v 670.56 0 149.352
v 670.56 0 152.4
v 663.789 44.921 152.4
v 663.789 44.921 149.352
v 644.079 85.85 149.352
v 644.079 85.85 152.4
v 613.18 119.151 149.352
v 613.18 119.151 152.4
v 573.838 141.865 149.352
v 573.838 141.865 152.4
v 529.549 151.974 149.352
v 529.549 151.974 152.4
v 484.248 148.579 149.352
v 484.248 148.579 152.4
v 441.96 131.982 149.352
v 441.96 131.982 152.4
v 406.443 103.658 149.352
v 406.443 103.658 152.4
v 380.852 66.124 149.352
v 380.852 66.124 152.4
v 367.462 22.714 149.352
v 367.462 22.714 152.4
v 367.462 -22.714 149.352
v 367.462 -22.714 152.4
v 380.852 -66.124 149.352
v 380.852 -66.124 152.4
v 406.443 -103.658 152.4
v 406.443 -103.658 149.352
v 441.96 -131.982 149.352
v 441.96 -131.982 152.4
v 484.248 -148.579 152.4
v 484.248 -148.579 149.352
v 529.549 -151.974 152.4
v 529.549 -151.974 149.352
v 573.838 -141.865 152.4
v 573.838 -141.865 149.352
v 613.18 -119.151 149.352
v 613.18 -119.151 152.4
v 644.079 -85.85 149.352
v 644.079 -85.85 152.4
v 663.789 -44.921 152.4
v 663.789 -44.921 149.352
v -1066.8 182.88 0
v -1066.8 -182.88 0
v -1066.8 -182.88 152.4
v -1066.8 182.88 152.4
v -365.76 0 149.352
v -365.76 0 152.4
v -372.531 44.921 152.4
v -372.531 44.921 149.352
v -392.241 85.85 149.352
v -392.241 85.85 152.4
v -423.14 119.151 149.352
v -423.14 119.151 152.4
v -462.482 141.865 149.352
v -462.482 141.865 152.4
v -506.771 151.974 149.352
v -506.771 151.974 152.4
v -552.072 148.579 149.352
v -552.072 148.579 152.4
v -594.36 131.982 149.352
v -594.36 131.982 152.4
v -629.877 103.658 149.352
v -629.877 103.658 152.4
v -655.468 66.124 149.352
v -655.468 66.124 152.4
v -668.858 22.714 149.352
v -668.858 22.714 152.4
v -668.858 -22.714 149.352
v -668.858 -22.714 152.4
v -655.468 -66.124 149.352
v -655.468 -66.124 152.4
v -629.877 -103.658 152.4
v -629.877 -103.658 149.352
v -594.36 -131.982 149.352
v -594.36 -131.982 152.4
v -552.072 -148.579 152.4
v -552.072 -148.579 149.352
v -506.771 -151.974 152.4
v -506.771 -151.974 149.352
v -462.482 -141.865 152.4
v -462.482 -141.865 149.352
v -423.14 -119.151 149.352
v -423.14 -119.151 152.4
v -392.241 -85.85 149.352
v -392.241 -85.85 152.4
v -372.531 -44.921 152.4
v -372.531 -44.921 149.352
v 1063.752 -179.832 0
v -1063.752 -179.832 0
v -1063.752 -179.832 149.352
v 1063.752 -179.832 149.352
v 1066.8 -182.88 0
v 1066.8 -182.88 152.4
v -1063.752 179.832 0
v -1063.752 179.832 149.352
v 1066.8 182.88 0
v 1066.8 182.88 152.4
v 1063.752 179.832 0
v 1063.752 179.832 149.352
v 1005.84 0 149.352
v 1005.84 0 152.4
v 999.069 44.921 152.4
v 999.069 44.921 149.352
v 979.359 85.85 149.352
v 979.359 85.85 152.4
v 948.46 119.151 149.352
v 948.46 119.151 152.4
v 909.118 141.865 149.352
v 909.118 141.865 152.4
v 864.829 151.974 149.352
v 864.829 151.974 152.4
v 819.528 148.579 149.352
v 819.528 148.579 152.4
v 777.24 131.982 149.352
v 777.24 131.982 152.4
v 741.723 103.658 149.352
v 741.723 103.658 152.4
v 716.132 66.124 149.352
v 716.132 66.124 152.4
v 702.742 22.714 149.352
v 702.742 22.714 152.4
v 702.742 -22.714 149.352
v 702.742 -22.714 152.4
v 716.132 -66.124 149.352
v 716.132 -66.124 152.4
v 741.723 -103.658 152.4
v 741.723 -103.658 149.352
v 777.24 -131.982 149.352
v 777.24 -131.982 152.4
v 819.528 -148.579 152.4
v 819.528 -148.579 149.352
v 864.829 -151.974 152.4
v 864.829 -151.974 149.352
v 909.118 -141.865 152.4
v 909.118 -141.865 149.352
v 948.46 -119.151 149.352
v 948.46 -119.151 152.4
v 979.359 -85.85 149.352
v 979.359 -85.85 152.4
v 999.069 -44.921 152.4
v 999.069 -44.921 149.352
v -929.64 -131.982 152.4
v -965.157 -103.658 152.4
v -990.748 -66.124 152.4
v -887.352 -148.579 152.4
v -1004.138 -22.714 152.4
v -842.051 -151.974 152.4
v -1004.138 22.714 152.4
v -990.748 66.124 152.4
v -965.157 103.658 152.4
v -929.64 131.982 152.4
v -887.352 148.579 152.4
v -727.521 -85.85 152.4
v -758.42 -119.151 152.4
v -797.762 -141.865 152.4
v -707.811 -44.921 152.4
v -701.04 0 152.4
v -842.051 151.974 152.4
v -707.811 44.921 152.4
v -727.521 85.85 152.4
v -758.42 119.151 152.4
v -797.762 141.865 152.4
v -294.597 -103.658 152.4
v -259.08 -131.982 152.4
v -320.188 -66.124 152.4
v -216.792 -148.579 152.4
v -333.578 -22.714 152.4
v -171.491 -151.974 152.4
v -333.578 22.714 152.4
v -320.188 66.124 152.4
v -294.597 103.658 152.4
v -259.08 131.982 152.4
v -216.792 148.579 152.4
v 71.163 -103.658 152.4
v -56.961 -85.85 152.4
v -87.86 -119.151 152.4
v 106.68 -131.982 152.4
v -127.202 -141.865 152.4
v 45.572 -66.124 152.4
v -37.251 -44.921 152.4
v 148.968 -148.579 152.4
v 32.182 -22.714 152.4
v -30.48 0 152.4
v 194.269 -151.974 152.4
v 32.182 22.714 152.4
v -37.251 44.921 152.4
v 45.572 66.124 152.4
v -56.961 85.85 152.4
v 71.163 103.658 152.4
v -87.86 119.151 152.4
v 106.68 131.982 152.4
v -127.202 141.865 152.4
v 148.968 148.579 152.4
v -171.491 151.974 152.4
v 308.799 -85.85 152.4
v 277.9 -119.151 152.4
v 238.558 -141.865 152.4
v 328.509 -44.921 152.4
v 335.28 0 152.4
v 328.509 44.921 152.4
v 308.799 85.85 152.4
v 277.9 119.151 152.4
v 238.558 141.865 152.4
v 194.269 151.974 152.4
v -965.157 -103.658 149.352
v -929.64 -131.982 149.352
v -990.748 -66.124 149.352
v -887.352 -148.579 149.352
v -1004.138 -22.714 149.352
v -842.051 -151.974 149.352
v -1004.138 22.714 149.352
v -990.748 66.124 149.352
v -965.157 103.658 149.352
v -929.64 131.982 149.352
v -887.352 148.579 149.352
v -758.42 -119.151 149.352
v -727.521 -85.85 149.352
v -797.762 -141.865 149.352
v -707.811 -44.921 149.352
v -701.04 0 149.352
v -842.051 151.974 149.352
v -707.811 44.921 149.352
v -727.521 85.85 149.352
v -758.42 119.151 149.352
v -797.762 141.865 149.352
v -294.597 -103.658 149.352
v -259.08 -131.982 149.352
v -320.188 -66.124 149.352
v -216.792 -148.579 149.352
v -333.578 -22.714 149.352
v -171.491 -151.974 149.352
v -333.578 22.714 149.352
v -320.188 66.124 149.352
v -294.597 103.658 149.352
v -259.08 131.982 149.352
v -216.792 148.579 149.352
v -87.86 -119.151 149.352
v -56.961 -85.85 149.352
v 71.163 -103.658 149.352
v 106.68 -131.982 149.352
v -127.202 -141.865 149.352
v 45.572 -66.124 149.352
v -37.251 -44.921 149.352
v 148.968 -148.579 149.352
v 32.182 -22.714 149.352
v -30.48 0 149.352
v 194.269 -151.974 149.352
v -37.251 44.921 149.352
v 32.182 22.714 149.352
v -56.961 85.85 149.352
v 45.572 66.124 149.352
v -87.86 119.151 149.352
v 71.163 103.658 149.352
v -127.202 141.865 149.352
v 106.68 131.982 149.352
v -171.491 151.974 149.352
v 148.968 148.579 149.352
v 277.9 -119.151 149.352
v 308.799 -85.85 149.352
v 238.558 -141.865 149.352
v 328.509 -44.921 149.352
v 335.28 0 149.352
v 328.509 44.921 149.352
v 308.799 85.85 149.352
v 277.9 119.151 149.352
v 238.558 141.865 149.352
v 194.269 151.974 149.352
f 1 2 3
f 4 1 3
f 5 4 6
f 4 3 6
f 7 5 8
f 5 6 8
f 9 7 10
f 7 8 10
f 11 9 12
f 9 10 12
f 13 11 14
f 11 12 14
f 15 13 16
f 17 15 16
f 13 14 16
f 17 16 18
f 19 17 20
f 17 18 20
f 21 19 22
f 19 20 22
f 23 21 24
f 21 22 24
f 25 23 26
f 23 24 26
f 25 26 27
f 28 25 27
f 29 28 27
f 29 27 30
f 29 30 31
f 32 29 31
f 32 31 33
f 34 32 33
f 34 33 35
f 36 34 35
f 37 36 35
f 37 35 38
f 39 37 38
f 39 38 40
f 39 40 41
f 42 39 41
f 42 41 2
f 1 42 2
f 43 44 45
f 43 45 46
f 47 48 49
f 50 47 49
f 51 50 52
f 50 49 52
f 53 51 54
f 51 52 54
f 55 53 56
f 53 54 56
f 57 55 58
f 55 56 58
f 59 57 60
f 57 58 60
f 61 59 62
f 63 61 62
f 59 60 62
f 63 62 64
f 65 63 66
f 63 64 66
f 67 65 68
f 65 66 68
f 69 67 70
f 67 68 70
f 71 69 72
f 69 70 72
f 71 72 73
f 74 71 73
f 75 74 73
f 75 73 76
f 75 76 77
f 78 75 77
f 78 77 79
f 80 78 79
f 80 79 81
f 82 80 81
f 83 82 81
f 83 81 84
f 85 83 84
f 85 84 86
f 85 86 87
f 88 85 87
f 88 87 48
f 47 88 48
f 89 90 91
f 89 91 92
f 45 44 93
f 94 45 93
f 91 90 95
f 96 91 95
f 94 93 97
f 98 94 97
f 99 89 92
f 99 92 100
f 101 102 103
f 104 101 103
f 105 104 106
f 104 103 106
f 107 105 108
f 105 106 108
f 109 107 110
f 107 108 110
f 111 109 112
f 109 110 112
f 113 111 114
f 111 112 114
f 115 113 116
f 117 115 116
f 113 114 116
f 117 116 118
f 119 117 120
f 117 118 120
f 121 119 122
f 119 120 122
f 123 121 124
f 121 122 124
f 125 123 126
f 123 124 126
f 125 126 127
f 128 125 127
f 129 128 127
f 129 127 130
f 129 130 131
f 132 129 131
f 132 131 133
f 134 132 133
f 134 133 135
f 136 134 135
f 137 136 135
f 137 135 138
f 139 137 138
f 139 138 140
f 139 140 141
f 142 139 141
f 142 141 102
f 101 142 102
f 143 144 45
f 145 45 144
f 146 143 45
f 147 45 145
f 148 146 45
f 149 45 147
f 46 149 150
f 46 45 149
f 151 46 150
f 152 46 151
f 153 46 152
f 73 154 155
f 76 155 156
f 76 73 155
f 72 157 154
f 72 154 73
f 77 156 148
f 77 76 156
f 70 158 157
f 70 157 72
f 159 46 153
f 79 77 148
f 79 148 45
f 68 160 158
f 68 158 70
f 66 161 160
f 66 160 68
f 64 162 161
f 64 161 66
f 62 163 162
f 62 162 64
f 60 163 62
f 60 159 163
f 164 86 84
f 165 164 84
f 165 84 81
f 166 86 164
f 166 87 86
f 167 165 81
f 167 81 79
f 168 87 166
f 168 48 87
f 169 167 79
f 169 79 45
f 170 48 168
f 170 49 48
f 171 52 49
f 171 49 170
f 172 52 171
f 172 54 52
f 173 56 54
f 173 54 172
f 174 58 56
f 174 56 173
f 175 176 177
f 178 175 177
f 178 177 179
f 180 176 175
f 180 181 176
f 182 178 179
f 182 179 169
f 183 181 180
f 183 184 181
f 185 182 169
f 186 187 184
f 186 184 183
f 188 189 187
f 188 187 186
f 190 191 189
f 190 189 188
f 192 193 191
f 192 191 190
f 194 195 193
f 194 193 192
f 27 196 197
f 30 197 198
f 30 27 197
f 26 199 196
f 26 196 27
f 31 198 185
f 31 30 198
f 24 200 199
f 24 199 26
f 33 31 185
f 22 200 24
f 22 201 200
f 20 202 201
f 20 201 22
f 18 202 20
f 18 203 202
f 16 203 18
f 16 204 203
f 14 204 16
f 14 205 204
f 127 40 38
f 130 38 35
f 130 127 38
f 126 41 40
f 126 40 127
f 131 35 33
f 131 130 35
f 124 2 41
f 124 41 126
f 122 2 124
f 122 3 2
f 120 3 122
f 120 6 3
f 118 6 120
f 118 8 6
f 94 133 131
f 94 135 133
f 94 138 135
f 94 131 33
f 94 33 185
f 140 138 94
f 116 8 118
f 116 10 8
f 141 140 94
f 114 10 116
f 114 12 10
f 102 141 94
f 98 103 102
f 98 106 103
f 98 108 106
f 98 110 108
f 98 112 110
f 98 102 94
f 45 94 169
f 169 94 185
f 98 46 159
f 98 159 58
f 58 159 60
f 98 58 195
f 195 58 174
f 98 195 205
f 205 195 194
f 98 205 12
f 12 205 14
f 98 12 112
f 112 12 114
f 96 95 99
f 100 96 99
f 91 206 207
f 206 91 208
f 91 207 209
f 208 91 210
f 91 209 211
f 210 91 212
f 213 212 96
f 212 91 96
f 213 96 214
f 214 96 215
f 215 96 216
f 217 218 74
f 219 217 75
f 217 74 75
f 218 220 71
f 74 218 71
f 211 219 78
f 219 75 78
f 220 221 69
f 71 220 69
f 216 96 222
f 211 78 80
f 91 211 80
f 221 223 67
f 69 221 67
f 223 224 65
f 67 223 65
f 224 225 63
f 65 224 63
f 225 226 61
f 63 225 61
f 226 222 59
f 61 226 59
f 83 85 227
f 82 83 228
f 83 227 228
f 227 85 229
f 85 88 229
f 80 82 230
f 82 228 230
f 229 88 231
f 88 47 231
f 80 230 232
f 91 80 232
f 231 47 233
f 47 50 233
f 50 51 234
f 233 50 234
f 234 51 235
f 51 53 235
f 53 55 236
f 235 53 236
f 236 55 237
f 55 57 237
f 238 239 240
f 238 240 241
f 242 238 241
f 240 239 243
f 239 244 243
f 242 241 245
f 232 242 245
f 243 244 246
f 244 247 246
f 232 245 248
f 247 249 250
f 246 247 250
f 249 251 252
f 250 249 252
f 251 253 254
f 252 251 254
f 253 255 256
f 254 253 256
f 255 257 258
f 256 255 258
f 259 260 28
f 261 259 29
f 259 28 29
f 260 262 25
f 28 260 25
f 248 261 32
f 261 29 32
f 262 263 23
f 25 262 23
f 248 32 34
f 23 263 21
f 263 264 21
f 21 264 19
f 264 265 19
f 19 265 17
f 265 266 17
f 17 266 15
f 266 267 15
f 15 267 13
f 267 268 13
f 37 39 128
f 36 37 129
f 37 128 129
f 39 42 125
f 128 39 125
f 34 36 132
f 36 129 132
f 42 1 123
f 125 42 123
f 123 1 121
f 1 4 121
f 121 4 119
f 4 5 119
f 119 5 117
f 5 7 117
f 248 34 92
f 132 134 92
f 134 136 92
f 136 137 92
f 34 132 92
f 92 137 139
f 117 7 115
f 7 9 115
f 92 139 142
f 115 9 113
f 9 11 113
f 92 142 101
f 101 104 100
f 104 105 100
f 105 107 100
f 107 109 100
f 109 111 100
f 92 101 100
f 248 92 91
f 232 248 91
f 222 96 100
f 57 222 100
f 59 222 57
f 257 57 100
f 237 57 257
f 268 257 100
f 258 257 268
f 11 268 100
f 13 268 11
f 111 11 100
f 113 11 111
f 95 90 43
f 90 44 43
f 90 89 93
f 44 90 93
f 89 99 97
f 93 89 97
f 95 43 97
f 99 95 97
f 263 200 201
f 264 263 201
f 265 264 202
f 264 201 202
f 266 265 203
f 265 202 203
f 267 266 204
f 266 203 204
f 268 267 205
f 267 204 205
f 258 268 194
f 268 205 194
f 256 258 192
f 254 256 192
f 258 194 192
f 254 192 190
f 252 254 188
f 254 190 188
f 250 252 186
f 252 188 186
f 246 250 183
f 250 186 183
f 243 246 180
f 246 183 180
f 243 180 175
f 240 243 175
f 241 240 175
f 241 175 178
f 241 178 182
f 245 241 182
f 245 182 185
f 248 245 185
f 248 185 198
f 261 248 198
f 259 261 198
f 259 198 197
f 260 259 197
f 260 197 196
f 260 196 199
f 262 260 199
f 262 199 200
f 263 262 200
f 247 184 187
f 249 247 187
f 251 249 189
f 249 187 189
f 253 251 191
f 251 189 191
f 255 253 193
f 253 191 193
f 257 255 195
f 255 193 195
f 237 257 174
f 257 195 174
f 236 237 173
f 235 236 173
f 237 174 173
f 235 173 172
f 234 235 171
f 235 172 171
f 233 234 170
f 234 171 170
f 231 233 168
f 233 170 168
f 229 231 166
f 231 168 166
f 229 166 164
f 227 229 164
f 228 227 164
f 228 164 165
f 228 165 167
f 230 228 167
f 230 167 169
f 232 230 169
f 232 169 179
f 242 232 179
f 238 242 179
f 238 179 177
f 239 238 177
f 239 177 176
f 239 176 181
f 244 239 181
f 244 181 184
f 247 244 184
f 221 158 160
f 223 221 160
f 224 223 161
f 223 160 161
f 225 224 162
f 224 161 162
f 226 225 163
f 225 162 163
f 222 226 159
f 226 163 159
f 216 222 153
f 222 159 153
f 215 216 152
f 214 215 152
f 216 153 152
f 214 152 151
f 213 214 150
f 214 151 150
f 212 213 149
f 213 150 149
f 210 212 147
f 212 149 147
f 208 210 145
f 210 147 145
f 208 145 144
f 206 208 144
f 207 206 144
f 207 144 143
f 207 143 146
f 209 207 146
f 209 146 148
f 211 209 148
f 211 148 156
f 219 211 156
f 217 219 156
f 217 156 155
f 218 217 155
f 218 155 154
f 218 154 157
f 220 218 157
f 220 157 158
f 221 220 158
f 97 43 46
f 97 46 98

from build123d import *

# Parameters (mm, degrees)
F0_W     = 2133.6
F0_H     = 365.76
F1_DEPTH = 152.4
F2_T     = -3.048
F3_R     = 152.4
F4_DEPTH = 152.401


with BuildPart() as f1:
    # F0 (on Top) → F1 (new body)
    with BuildSketch(Plane.XY):
        Rectangle(F0_W, F0_H)
    extrude(amount=F1_DEPTH)

    # F2
    f2_openings = [f1.faces().sort_by_distance(p)[0] for p in [
        (0, 0, 0),
    ]]
    offset(amount=F2_T, openings=f2_openings)

    # F3 (on face) → F4 (cut, through all)
    with BuildSketch(Plane.XY.offset(152.4)):
        with Locations((182.88, 0)):
            Circle(F3_R)
        with Locations((518.16, 0)):
            Circle(F3_R)
        with Locations((853.44, 0)):
            Circle(F3_R)
        with Locations((-182.88, 0)):
            Circle(F3_R)
        with Locations((-518.16, 0)):
            Circle(F3_R)
        with Locations((-853.44, 0)):
            Circle(F3_R)
    extrude(amount=-F4_DEPTH, mode=Mode.SUBTRACT)


solid = f1.part
